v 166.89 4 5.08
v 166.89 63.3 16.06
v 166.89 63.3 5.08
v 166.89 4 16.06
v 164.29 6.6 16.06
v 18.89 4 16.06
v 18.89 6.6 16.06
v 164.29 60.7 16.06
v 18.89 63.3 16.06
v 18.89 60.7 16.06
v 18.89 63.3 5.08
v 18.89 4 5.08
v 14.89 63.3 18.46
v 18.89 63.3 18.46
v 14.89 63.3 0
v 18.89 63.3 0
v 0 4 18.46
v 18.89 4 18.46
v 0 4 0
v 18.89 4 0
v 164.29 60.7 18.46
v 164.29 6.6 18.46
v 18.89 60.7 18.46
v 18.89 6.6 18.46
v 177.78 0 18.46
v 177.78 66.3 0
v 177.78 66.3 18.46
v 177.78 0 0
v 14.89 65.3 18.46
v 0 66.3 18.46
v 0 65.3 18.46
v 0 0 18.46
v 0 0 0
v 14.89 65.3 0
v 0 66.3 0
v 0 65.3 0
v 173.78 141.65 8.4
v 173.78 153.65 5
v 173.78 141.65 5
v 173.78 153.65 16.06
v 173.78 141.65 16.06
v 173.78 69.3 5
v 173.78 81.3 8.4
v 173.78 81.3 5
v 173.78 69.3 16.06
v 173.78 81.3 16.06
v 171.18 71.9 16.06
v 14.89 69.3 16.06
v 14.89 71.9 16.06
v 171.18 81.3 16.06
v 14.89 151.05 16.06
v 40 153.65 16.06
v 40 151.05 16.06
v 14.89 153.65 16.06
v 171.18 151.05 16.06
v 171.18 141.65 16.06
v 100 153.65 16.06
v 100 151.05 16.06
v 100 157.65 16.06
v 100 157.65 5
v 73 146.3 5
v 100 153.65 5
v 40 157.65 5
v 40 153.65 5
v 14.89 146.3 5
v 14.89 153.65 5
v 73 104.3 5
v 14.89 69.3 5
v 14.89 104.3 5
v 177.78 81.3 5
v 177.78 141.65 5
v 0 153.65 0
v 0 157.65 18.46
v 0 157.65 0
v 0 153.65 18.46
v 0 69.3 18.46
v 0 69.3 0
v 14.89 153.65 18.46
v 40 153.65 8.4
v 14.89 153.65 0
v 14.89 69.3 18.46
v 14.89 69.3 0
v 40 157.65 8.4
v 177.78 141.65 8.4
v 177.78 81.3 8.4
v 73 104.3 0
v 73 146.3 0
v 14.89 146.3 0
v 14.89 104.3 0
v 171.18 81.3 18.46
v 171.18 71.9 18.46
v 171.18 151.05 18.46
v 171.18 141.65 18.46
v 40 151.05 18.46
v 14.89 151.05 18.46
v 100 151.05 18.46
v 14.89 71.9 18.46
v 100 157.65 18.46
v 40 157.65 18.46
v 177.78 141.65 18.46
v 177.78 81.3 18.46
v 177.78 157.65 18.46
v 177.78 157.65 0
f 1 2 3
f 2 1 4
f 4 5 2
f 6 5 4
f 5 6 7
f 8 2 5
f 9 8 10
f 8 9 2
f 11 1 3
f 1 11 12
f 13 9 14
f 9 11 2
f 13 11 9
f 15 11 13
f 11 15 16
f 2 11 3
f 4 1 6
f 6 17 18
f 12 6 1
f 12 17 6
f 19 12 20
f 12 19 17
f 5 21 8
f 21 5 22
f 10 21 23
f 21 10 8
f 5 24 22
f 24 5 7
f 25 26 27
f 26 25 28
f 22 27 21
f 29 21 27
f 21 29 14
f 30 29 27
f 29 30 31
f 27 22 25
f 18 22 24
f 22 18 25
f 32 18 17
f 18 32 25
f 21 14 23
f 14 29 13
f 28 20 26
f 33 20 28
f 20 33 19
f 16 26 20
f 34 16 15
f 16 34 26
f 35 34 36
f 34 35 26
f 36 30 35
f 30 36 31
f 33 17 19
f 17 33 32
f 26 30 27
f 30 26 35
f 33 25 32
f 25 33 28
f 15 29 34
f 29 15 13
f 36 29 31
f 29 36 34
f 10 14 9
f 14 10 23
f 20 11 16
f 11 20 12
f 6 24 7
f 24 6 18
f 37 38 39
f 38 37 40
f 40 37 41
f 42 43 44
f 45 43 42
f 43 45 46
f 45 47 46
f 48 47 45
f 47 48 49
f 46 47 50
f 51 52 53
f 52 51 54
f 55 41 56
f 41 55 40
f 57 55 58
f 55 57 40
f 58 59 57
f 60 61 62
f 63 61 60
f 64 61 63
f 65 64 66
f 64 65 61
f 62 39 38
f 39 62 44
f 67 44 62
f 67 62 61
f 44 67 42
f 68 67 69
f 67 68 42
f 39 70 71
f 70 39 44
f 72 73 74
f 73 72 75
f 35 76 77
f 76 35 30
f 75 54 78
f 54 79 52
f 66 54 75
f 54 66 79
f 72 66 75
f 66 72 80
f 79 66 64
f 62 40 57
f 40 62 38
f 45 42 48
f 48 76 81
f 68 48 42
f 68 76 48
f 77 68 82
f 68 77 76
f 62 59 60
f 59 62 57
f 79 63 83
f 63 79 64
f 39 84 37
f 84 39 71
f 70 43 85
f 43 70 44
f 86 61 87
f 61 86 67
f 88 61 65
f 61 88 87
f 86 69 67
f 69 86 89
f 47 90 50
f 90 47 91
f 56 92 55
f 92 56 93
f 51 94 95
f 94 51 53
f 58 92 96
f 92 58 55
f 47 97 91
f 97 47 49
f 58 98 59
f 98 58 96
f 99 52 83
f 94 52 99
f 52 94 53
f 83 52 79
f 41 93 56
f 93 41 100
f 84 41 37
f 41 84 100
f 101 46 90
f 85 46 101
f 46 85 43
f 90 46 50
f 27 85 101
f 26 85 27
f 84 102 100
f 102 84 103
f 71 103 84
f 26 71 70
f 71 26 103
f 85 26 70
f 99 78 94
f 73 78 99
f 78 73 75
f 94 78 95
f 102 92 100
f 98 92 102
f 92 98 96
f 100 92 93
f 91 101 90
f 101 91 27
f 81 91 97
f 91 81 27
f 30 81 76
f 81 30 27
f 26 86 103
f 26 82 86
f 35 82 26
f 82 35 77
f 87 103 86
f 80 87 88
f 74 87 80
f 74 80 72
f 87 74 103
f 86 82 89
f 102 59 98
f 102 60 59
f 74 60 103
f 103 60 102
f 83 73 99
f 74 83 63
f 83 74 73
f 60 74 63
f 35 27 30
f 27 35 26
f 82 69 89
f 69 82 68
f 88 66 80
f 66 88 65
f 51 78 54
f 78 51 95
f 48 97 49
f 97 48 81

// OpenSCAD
MobileWidht = 84.35;
MobileHight = 11.06;
MobileLenght = 173.78;

keybWidth = 59.30;
keybHight = 10.98;
keybLenght = 152;

edgeHolderWidth = 4;
midSeparatorWidth = 6;

holderWidth = MobileLenght+edgeHolderWidth;
minBaseHight = 5;
topOfHolderHight = 2.4;
topOfHolderLenght = 2.6;

//TotalHight is MobileHihgt (cause it is bigger then keyboardHight + minimal base plate hight + HightofholderTop 
totalHight = minBaseHight + MobileHight + topOfHolderHight;



module mockKeyboard() {
    cube([keybLenght,keybWidth,keybHight]);
}

module mockKyebTopCut(){
    cube([keybLenght-2*topOfHolderLenght,keybWidth-2*topOfHolderLenght,keybHight]);    
}

module mockPhone(){
    cube([MobileLenght,MobileWidht,MobileHight]);
    //side buttons, bigger on purpose to cut throuth the edge of the holder
    translate([40,MobileWidht,0])
    cube([60,edgeHolderWidth+1,MobileHight]);
    // charger connector, repro ...
    translate([MobileLenght,12,0])
    cube([edgeHolderWidth+1,MobileWidht-2*12,MobileHight]);
    //Camera
    CameraLenght = 73; //from edge of the phone
    CameraWidth = 42;
    translate([0,35,-10])
    cube([CameraLenght,CameraWidth,10]);    
}

module mockPhoneTopCut() {
    cube([MobileLenght-2*topOfHolderLenght,MobileWidht-2*topOfHolderLenght,MobileHight]);
    //side buttons, bigger on purpose to cut throuth the edge of the holder
    translate([40-topOfHolderLenght,MobileWidht-2*topOfHolderLenght,0])
    cube([60,edgeHolderWidth+1+topOfHolderLenght,MobileHight]);
    // charger connector, repro ...
    translate([MobileLenght-2*topOfHolderLenght,12-topOfHolderLenght,0])
    cube([edgeHolderWidth+1+topOfHolderLenght,MobileWidht-2*12,MobileHight+1]);
}

/*
mockKeyboard();
translate([topOfHolderLenght,topOfHolderLenght,topOfHolderHight+1])
mockKyebTopCut();
*/

/*
mockPhone();
translate([topOfHolderLenght,topOfHolderLenght,topOfHolderHight+1])
mockPhoneTopCut();
*/


//Keyboard Holder
difference(){
  cube([holderWidth,edgeHolderWidth + keybWidth + midSeparatorWidth/2,totalHight]);
  translate([edgeHolderWidth+(MobileLenght-keybLenght)/2,edgeHolderWidth,totalHight-(keybHight+topOfHolderHight)])  
  union() { 
    mockKeyboard();
    translate([topOfHolderLenght,topOfHolderLenght,topOfHolderHight+1])
    mockKyebTopCut();
  }
  //tweaks: remove left parts to allow keyboard to slide in and out;
  translate([-1,edgeHolderWidth,-1])
  cube([1+edgeHolderWidth+(MobileLenght-keybLenght)/2,keybWidth+2,totalHight+2]);
  translate([edgeHolderWidth+(MobileLenght-keybLenght)/2,edgeHolderWidth,-1])
  cube([edgeHolderWidth,keybWidth,totalHight+2]);
}


//Move the Phone holder on Y axe behind the Keyboard Holder
translate([0,edgeHolderWidth + keybWidth + midSeparatorWidth/2,0])
//Phone Holder
difference() {
    cube([holderWidth,midSeparatorWidth/2 + MobileWidht + edgeHolderWidth,totalHight]);
    translate([0,midSeparatorWidth/2,totalHight-(MobileHight+topOfHolderHight)])
    union() {
        mockPhone();
        translate([topOfHolderLenght,topOfHolderLenght,topOfHolderHight+1])
        mockPhoneTopCut();
    }
    //tweaks: remove left parts to allow keyboard to slide in and out;
    translate([-1,midSeparatorWidth/2,-1])
    cube([1+edgeHolderWidth+(MobileLenght-keybLenght)/2,MobileWidht,totalHight+2]);
}
